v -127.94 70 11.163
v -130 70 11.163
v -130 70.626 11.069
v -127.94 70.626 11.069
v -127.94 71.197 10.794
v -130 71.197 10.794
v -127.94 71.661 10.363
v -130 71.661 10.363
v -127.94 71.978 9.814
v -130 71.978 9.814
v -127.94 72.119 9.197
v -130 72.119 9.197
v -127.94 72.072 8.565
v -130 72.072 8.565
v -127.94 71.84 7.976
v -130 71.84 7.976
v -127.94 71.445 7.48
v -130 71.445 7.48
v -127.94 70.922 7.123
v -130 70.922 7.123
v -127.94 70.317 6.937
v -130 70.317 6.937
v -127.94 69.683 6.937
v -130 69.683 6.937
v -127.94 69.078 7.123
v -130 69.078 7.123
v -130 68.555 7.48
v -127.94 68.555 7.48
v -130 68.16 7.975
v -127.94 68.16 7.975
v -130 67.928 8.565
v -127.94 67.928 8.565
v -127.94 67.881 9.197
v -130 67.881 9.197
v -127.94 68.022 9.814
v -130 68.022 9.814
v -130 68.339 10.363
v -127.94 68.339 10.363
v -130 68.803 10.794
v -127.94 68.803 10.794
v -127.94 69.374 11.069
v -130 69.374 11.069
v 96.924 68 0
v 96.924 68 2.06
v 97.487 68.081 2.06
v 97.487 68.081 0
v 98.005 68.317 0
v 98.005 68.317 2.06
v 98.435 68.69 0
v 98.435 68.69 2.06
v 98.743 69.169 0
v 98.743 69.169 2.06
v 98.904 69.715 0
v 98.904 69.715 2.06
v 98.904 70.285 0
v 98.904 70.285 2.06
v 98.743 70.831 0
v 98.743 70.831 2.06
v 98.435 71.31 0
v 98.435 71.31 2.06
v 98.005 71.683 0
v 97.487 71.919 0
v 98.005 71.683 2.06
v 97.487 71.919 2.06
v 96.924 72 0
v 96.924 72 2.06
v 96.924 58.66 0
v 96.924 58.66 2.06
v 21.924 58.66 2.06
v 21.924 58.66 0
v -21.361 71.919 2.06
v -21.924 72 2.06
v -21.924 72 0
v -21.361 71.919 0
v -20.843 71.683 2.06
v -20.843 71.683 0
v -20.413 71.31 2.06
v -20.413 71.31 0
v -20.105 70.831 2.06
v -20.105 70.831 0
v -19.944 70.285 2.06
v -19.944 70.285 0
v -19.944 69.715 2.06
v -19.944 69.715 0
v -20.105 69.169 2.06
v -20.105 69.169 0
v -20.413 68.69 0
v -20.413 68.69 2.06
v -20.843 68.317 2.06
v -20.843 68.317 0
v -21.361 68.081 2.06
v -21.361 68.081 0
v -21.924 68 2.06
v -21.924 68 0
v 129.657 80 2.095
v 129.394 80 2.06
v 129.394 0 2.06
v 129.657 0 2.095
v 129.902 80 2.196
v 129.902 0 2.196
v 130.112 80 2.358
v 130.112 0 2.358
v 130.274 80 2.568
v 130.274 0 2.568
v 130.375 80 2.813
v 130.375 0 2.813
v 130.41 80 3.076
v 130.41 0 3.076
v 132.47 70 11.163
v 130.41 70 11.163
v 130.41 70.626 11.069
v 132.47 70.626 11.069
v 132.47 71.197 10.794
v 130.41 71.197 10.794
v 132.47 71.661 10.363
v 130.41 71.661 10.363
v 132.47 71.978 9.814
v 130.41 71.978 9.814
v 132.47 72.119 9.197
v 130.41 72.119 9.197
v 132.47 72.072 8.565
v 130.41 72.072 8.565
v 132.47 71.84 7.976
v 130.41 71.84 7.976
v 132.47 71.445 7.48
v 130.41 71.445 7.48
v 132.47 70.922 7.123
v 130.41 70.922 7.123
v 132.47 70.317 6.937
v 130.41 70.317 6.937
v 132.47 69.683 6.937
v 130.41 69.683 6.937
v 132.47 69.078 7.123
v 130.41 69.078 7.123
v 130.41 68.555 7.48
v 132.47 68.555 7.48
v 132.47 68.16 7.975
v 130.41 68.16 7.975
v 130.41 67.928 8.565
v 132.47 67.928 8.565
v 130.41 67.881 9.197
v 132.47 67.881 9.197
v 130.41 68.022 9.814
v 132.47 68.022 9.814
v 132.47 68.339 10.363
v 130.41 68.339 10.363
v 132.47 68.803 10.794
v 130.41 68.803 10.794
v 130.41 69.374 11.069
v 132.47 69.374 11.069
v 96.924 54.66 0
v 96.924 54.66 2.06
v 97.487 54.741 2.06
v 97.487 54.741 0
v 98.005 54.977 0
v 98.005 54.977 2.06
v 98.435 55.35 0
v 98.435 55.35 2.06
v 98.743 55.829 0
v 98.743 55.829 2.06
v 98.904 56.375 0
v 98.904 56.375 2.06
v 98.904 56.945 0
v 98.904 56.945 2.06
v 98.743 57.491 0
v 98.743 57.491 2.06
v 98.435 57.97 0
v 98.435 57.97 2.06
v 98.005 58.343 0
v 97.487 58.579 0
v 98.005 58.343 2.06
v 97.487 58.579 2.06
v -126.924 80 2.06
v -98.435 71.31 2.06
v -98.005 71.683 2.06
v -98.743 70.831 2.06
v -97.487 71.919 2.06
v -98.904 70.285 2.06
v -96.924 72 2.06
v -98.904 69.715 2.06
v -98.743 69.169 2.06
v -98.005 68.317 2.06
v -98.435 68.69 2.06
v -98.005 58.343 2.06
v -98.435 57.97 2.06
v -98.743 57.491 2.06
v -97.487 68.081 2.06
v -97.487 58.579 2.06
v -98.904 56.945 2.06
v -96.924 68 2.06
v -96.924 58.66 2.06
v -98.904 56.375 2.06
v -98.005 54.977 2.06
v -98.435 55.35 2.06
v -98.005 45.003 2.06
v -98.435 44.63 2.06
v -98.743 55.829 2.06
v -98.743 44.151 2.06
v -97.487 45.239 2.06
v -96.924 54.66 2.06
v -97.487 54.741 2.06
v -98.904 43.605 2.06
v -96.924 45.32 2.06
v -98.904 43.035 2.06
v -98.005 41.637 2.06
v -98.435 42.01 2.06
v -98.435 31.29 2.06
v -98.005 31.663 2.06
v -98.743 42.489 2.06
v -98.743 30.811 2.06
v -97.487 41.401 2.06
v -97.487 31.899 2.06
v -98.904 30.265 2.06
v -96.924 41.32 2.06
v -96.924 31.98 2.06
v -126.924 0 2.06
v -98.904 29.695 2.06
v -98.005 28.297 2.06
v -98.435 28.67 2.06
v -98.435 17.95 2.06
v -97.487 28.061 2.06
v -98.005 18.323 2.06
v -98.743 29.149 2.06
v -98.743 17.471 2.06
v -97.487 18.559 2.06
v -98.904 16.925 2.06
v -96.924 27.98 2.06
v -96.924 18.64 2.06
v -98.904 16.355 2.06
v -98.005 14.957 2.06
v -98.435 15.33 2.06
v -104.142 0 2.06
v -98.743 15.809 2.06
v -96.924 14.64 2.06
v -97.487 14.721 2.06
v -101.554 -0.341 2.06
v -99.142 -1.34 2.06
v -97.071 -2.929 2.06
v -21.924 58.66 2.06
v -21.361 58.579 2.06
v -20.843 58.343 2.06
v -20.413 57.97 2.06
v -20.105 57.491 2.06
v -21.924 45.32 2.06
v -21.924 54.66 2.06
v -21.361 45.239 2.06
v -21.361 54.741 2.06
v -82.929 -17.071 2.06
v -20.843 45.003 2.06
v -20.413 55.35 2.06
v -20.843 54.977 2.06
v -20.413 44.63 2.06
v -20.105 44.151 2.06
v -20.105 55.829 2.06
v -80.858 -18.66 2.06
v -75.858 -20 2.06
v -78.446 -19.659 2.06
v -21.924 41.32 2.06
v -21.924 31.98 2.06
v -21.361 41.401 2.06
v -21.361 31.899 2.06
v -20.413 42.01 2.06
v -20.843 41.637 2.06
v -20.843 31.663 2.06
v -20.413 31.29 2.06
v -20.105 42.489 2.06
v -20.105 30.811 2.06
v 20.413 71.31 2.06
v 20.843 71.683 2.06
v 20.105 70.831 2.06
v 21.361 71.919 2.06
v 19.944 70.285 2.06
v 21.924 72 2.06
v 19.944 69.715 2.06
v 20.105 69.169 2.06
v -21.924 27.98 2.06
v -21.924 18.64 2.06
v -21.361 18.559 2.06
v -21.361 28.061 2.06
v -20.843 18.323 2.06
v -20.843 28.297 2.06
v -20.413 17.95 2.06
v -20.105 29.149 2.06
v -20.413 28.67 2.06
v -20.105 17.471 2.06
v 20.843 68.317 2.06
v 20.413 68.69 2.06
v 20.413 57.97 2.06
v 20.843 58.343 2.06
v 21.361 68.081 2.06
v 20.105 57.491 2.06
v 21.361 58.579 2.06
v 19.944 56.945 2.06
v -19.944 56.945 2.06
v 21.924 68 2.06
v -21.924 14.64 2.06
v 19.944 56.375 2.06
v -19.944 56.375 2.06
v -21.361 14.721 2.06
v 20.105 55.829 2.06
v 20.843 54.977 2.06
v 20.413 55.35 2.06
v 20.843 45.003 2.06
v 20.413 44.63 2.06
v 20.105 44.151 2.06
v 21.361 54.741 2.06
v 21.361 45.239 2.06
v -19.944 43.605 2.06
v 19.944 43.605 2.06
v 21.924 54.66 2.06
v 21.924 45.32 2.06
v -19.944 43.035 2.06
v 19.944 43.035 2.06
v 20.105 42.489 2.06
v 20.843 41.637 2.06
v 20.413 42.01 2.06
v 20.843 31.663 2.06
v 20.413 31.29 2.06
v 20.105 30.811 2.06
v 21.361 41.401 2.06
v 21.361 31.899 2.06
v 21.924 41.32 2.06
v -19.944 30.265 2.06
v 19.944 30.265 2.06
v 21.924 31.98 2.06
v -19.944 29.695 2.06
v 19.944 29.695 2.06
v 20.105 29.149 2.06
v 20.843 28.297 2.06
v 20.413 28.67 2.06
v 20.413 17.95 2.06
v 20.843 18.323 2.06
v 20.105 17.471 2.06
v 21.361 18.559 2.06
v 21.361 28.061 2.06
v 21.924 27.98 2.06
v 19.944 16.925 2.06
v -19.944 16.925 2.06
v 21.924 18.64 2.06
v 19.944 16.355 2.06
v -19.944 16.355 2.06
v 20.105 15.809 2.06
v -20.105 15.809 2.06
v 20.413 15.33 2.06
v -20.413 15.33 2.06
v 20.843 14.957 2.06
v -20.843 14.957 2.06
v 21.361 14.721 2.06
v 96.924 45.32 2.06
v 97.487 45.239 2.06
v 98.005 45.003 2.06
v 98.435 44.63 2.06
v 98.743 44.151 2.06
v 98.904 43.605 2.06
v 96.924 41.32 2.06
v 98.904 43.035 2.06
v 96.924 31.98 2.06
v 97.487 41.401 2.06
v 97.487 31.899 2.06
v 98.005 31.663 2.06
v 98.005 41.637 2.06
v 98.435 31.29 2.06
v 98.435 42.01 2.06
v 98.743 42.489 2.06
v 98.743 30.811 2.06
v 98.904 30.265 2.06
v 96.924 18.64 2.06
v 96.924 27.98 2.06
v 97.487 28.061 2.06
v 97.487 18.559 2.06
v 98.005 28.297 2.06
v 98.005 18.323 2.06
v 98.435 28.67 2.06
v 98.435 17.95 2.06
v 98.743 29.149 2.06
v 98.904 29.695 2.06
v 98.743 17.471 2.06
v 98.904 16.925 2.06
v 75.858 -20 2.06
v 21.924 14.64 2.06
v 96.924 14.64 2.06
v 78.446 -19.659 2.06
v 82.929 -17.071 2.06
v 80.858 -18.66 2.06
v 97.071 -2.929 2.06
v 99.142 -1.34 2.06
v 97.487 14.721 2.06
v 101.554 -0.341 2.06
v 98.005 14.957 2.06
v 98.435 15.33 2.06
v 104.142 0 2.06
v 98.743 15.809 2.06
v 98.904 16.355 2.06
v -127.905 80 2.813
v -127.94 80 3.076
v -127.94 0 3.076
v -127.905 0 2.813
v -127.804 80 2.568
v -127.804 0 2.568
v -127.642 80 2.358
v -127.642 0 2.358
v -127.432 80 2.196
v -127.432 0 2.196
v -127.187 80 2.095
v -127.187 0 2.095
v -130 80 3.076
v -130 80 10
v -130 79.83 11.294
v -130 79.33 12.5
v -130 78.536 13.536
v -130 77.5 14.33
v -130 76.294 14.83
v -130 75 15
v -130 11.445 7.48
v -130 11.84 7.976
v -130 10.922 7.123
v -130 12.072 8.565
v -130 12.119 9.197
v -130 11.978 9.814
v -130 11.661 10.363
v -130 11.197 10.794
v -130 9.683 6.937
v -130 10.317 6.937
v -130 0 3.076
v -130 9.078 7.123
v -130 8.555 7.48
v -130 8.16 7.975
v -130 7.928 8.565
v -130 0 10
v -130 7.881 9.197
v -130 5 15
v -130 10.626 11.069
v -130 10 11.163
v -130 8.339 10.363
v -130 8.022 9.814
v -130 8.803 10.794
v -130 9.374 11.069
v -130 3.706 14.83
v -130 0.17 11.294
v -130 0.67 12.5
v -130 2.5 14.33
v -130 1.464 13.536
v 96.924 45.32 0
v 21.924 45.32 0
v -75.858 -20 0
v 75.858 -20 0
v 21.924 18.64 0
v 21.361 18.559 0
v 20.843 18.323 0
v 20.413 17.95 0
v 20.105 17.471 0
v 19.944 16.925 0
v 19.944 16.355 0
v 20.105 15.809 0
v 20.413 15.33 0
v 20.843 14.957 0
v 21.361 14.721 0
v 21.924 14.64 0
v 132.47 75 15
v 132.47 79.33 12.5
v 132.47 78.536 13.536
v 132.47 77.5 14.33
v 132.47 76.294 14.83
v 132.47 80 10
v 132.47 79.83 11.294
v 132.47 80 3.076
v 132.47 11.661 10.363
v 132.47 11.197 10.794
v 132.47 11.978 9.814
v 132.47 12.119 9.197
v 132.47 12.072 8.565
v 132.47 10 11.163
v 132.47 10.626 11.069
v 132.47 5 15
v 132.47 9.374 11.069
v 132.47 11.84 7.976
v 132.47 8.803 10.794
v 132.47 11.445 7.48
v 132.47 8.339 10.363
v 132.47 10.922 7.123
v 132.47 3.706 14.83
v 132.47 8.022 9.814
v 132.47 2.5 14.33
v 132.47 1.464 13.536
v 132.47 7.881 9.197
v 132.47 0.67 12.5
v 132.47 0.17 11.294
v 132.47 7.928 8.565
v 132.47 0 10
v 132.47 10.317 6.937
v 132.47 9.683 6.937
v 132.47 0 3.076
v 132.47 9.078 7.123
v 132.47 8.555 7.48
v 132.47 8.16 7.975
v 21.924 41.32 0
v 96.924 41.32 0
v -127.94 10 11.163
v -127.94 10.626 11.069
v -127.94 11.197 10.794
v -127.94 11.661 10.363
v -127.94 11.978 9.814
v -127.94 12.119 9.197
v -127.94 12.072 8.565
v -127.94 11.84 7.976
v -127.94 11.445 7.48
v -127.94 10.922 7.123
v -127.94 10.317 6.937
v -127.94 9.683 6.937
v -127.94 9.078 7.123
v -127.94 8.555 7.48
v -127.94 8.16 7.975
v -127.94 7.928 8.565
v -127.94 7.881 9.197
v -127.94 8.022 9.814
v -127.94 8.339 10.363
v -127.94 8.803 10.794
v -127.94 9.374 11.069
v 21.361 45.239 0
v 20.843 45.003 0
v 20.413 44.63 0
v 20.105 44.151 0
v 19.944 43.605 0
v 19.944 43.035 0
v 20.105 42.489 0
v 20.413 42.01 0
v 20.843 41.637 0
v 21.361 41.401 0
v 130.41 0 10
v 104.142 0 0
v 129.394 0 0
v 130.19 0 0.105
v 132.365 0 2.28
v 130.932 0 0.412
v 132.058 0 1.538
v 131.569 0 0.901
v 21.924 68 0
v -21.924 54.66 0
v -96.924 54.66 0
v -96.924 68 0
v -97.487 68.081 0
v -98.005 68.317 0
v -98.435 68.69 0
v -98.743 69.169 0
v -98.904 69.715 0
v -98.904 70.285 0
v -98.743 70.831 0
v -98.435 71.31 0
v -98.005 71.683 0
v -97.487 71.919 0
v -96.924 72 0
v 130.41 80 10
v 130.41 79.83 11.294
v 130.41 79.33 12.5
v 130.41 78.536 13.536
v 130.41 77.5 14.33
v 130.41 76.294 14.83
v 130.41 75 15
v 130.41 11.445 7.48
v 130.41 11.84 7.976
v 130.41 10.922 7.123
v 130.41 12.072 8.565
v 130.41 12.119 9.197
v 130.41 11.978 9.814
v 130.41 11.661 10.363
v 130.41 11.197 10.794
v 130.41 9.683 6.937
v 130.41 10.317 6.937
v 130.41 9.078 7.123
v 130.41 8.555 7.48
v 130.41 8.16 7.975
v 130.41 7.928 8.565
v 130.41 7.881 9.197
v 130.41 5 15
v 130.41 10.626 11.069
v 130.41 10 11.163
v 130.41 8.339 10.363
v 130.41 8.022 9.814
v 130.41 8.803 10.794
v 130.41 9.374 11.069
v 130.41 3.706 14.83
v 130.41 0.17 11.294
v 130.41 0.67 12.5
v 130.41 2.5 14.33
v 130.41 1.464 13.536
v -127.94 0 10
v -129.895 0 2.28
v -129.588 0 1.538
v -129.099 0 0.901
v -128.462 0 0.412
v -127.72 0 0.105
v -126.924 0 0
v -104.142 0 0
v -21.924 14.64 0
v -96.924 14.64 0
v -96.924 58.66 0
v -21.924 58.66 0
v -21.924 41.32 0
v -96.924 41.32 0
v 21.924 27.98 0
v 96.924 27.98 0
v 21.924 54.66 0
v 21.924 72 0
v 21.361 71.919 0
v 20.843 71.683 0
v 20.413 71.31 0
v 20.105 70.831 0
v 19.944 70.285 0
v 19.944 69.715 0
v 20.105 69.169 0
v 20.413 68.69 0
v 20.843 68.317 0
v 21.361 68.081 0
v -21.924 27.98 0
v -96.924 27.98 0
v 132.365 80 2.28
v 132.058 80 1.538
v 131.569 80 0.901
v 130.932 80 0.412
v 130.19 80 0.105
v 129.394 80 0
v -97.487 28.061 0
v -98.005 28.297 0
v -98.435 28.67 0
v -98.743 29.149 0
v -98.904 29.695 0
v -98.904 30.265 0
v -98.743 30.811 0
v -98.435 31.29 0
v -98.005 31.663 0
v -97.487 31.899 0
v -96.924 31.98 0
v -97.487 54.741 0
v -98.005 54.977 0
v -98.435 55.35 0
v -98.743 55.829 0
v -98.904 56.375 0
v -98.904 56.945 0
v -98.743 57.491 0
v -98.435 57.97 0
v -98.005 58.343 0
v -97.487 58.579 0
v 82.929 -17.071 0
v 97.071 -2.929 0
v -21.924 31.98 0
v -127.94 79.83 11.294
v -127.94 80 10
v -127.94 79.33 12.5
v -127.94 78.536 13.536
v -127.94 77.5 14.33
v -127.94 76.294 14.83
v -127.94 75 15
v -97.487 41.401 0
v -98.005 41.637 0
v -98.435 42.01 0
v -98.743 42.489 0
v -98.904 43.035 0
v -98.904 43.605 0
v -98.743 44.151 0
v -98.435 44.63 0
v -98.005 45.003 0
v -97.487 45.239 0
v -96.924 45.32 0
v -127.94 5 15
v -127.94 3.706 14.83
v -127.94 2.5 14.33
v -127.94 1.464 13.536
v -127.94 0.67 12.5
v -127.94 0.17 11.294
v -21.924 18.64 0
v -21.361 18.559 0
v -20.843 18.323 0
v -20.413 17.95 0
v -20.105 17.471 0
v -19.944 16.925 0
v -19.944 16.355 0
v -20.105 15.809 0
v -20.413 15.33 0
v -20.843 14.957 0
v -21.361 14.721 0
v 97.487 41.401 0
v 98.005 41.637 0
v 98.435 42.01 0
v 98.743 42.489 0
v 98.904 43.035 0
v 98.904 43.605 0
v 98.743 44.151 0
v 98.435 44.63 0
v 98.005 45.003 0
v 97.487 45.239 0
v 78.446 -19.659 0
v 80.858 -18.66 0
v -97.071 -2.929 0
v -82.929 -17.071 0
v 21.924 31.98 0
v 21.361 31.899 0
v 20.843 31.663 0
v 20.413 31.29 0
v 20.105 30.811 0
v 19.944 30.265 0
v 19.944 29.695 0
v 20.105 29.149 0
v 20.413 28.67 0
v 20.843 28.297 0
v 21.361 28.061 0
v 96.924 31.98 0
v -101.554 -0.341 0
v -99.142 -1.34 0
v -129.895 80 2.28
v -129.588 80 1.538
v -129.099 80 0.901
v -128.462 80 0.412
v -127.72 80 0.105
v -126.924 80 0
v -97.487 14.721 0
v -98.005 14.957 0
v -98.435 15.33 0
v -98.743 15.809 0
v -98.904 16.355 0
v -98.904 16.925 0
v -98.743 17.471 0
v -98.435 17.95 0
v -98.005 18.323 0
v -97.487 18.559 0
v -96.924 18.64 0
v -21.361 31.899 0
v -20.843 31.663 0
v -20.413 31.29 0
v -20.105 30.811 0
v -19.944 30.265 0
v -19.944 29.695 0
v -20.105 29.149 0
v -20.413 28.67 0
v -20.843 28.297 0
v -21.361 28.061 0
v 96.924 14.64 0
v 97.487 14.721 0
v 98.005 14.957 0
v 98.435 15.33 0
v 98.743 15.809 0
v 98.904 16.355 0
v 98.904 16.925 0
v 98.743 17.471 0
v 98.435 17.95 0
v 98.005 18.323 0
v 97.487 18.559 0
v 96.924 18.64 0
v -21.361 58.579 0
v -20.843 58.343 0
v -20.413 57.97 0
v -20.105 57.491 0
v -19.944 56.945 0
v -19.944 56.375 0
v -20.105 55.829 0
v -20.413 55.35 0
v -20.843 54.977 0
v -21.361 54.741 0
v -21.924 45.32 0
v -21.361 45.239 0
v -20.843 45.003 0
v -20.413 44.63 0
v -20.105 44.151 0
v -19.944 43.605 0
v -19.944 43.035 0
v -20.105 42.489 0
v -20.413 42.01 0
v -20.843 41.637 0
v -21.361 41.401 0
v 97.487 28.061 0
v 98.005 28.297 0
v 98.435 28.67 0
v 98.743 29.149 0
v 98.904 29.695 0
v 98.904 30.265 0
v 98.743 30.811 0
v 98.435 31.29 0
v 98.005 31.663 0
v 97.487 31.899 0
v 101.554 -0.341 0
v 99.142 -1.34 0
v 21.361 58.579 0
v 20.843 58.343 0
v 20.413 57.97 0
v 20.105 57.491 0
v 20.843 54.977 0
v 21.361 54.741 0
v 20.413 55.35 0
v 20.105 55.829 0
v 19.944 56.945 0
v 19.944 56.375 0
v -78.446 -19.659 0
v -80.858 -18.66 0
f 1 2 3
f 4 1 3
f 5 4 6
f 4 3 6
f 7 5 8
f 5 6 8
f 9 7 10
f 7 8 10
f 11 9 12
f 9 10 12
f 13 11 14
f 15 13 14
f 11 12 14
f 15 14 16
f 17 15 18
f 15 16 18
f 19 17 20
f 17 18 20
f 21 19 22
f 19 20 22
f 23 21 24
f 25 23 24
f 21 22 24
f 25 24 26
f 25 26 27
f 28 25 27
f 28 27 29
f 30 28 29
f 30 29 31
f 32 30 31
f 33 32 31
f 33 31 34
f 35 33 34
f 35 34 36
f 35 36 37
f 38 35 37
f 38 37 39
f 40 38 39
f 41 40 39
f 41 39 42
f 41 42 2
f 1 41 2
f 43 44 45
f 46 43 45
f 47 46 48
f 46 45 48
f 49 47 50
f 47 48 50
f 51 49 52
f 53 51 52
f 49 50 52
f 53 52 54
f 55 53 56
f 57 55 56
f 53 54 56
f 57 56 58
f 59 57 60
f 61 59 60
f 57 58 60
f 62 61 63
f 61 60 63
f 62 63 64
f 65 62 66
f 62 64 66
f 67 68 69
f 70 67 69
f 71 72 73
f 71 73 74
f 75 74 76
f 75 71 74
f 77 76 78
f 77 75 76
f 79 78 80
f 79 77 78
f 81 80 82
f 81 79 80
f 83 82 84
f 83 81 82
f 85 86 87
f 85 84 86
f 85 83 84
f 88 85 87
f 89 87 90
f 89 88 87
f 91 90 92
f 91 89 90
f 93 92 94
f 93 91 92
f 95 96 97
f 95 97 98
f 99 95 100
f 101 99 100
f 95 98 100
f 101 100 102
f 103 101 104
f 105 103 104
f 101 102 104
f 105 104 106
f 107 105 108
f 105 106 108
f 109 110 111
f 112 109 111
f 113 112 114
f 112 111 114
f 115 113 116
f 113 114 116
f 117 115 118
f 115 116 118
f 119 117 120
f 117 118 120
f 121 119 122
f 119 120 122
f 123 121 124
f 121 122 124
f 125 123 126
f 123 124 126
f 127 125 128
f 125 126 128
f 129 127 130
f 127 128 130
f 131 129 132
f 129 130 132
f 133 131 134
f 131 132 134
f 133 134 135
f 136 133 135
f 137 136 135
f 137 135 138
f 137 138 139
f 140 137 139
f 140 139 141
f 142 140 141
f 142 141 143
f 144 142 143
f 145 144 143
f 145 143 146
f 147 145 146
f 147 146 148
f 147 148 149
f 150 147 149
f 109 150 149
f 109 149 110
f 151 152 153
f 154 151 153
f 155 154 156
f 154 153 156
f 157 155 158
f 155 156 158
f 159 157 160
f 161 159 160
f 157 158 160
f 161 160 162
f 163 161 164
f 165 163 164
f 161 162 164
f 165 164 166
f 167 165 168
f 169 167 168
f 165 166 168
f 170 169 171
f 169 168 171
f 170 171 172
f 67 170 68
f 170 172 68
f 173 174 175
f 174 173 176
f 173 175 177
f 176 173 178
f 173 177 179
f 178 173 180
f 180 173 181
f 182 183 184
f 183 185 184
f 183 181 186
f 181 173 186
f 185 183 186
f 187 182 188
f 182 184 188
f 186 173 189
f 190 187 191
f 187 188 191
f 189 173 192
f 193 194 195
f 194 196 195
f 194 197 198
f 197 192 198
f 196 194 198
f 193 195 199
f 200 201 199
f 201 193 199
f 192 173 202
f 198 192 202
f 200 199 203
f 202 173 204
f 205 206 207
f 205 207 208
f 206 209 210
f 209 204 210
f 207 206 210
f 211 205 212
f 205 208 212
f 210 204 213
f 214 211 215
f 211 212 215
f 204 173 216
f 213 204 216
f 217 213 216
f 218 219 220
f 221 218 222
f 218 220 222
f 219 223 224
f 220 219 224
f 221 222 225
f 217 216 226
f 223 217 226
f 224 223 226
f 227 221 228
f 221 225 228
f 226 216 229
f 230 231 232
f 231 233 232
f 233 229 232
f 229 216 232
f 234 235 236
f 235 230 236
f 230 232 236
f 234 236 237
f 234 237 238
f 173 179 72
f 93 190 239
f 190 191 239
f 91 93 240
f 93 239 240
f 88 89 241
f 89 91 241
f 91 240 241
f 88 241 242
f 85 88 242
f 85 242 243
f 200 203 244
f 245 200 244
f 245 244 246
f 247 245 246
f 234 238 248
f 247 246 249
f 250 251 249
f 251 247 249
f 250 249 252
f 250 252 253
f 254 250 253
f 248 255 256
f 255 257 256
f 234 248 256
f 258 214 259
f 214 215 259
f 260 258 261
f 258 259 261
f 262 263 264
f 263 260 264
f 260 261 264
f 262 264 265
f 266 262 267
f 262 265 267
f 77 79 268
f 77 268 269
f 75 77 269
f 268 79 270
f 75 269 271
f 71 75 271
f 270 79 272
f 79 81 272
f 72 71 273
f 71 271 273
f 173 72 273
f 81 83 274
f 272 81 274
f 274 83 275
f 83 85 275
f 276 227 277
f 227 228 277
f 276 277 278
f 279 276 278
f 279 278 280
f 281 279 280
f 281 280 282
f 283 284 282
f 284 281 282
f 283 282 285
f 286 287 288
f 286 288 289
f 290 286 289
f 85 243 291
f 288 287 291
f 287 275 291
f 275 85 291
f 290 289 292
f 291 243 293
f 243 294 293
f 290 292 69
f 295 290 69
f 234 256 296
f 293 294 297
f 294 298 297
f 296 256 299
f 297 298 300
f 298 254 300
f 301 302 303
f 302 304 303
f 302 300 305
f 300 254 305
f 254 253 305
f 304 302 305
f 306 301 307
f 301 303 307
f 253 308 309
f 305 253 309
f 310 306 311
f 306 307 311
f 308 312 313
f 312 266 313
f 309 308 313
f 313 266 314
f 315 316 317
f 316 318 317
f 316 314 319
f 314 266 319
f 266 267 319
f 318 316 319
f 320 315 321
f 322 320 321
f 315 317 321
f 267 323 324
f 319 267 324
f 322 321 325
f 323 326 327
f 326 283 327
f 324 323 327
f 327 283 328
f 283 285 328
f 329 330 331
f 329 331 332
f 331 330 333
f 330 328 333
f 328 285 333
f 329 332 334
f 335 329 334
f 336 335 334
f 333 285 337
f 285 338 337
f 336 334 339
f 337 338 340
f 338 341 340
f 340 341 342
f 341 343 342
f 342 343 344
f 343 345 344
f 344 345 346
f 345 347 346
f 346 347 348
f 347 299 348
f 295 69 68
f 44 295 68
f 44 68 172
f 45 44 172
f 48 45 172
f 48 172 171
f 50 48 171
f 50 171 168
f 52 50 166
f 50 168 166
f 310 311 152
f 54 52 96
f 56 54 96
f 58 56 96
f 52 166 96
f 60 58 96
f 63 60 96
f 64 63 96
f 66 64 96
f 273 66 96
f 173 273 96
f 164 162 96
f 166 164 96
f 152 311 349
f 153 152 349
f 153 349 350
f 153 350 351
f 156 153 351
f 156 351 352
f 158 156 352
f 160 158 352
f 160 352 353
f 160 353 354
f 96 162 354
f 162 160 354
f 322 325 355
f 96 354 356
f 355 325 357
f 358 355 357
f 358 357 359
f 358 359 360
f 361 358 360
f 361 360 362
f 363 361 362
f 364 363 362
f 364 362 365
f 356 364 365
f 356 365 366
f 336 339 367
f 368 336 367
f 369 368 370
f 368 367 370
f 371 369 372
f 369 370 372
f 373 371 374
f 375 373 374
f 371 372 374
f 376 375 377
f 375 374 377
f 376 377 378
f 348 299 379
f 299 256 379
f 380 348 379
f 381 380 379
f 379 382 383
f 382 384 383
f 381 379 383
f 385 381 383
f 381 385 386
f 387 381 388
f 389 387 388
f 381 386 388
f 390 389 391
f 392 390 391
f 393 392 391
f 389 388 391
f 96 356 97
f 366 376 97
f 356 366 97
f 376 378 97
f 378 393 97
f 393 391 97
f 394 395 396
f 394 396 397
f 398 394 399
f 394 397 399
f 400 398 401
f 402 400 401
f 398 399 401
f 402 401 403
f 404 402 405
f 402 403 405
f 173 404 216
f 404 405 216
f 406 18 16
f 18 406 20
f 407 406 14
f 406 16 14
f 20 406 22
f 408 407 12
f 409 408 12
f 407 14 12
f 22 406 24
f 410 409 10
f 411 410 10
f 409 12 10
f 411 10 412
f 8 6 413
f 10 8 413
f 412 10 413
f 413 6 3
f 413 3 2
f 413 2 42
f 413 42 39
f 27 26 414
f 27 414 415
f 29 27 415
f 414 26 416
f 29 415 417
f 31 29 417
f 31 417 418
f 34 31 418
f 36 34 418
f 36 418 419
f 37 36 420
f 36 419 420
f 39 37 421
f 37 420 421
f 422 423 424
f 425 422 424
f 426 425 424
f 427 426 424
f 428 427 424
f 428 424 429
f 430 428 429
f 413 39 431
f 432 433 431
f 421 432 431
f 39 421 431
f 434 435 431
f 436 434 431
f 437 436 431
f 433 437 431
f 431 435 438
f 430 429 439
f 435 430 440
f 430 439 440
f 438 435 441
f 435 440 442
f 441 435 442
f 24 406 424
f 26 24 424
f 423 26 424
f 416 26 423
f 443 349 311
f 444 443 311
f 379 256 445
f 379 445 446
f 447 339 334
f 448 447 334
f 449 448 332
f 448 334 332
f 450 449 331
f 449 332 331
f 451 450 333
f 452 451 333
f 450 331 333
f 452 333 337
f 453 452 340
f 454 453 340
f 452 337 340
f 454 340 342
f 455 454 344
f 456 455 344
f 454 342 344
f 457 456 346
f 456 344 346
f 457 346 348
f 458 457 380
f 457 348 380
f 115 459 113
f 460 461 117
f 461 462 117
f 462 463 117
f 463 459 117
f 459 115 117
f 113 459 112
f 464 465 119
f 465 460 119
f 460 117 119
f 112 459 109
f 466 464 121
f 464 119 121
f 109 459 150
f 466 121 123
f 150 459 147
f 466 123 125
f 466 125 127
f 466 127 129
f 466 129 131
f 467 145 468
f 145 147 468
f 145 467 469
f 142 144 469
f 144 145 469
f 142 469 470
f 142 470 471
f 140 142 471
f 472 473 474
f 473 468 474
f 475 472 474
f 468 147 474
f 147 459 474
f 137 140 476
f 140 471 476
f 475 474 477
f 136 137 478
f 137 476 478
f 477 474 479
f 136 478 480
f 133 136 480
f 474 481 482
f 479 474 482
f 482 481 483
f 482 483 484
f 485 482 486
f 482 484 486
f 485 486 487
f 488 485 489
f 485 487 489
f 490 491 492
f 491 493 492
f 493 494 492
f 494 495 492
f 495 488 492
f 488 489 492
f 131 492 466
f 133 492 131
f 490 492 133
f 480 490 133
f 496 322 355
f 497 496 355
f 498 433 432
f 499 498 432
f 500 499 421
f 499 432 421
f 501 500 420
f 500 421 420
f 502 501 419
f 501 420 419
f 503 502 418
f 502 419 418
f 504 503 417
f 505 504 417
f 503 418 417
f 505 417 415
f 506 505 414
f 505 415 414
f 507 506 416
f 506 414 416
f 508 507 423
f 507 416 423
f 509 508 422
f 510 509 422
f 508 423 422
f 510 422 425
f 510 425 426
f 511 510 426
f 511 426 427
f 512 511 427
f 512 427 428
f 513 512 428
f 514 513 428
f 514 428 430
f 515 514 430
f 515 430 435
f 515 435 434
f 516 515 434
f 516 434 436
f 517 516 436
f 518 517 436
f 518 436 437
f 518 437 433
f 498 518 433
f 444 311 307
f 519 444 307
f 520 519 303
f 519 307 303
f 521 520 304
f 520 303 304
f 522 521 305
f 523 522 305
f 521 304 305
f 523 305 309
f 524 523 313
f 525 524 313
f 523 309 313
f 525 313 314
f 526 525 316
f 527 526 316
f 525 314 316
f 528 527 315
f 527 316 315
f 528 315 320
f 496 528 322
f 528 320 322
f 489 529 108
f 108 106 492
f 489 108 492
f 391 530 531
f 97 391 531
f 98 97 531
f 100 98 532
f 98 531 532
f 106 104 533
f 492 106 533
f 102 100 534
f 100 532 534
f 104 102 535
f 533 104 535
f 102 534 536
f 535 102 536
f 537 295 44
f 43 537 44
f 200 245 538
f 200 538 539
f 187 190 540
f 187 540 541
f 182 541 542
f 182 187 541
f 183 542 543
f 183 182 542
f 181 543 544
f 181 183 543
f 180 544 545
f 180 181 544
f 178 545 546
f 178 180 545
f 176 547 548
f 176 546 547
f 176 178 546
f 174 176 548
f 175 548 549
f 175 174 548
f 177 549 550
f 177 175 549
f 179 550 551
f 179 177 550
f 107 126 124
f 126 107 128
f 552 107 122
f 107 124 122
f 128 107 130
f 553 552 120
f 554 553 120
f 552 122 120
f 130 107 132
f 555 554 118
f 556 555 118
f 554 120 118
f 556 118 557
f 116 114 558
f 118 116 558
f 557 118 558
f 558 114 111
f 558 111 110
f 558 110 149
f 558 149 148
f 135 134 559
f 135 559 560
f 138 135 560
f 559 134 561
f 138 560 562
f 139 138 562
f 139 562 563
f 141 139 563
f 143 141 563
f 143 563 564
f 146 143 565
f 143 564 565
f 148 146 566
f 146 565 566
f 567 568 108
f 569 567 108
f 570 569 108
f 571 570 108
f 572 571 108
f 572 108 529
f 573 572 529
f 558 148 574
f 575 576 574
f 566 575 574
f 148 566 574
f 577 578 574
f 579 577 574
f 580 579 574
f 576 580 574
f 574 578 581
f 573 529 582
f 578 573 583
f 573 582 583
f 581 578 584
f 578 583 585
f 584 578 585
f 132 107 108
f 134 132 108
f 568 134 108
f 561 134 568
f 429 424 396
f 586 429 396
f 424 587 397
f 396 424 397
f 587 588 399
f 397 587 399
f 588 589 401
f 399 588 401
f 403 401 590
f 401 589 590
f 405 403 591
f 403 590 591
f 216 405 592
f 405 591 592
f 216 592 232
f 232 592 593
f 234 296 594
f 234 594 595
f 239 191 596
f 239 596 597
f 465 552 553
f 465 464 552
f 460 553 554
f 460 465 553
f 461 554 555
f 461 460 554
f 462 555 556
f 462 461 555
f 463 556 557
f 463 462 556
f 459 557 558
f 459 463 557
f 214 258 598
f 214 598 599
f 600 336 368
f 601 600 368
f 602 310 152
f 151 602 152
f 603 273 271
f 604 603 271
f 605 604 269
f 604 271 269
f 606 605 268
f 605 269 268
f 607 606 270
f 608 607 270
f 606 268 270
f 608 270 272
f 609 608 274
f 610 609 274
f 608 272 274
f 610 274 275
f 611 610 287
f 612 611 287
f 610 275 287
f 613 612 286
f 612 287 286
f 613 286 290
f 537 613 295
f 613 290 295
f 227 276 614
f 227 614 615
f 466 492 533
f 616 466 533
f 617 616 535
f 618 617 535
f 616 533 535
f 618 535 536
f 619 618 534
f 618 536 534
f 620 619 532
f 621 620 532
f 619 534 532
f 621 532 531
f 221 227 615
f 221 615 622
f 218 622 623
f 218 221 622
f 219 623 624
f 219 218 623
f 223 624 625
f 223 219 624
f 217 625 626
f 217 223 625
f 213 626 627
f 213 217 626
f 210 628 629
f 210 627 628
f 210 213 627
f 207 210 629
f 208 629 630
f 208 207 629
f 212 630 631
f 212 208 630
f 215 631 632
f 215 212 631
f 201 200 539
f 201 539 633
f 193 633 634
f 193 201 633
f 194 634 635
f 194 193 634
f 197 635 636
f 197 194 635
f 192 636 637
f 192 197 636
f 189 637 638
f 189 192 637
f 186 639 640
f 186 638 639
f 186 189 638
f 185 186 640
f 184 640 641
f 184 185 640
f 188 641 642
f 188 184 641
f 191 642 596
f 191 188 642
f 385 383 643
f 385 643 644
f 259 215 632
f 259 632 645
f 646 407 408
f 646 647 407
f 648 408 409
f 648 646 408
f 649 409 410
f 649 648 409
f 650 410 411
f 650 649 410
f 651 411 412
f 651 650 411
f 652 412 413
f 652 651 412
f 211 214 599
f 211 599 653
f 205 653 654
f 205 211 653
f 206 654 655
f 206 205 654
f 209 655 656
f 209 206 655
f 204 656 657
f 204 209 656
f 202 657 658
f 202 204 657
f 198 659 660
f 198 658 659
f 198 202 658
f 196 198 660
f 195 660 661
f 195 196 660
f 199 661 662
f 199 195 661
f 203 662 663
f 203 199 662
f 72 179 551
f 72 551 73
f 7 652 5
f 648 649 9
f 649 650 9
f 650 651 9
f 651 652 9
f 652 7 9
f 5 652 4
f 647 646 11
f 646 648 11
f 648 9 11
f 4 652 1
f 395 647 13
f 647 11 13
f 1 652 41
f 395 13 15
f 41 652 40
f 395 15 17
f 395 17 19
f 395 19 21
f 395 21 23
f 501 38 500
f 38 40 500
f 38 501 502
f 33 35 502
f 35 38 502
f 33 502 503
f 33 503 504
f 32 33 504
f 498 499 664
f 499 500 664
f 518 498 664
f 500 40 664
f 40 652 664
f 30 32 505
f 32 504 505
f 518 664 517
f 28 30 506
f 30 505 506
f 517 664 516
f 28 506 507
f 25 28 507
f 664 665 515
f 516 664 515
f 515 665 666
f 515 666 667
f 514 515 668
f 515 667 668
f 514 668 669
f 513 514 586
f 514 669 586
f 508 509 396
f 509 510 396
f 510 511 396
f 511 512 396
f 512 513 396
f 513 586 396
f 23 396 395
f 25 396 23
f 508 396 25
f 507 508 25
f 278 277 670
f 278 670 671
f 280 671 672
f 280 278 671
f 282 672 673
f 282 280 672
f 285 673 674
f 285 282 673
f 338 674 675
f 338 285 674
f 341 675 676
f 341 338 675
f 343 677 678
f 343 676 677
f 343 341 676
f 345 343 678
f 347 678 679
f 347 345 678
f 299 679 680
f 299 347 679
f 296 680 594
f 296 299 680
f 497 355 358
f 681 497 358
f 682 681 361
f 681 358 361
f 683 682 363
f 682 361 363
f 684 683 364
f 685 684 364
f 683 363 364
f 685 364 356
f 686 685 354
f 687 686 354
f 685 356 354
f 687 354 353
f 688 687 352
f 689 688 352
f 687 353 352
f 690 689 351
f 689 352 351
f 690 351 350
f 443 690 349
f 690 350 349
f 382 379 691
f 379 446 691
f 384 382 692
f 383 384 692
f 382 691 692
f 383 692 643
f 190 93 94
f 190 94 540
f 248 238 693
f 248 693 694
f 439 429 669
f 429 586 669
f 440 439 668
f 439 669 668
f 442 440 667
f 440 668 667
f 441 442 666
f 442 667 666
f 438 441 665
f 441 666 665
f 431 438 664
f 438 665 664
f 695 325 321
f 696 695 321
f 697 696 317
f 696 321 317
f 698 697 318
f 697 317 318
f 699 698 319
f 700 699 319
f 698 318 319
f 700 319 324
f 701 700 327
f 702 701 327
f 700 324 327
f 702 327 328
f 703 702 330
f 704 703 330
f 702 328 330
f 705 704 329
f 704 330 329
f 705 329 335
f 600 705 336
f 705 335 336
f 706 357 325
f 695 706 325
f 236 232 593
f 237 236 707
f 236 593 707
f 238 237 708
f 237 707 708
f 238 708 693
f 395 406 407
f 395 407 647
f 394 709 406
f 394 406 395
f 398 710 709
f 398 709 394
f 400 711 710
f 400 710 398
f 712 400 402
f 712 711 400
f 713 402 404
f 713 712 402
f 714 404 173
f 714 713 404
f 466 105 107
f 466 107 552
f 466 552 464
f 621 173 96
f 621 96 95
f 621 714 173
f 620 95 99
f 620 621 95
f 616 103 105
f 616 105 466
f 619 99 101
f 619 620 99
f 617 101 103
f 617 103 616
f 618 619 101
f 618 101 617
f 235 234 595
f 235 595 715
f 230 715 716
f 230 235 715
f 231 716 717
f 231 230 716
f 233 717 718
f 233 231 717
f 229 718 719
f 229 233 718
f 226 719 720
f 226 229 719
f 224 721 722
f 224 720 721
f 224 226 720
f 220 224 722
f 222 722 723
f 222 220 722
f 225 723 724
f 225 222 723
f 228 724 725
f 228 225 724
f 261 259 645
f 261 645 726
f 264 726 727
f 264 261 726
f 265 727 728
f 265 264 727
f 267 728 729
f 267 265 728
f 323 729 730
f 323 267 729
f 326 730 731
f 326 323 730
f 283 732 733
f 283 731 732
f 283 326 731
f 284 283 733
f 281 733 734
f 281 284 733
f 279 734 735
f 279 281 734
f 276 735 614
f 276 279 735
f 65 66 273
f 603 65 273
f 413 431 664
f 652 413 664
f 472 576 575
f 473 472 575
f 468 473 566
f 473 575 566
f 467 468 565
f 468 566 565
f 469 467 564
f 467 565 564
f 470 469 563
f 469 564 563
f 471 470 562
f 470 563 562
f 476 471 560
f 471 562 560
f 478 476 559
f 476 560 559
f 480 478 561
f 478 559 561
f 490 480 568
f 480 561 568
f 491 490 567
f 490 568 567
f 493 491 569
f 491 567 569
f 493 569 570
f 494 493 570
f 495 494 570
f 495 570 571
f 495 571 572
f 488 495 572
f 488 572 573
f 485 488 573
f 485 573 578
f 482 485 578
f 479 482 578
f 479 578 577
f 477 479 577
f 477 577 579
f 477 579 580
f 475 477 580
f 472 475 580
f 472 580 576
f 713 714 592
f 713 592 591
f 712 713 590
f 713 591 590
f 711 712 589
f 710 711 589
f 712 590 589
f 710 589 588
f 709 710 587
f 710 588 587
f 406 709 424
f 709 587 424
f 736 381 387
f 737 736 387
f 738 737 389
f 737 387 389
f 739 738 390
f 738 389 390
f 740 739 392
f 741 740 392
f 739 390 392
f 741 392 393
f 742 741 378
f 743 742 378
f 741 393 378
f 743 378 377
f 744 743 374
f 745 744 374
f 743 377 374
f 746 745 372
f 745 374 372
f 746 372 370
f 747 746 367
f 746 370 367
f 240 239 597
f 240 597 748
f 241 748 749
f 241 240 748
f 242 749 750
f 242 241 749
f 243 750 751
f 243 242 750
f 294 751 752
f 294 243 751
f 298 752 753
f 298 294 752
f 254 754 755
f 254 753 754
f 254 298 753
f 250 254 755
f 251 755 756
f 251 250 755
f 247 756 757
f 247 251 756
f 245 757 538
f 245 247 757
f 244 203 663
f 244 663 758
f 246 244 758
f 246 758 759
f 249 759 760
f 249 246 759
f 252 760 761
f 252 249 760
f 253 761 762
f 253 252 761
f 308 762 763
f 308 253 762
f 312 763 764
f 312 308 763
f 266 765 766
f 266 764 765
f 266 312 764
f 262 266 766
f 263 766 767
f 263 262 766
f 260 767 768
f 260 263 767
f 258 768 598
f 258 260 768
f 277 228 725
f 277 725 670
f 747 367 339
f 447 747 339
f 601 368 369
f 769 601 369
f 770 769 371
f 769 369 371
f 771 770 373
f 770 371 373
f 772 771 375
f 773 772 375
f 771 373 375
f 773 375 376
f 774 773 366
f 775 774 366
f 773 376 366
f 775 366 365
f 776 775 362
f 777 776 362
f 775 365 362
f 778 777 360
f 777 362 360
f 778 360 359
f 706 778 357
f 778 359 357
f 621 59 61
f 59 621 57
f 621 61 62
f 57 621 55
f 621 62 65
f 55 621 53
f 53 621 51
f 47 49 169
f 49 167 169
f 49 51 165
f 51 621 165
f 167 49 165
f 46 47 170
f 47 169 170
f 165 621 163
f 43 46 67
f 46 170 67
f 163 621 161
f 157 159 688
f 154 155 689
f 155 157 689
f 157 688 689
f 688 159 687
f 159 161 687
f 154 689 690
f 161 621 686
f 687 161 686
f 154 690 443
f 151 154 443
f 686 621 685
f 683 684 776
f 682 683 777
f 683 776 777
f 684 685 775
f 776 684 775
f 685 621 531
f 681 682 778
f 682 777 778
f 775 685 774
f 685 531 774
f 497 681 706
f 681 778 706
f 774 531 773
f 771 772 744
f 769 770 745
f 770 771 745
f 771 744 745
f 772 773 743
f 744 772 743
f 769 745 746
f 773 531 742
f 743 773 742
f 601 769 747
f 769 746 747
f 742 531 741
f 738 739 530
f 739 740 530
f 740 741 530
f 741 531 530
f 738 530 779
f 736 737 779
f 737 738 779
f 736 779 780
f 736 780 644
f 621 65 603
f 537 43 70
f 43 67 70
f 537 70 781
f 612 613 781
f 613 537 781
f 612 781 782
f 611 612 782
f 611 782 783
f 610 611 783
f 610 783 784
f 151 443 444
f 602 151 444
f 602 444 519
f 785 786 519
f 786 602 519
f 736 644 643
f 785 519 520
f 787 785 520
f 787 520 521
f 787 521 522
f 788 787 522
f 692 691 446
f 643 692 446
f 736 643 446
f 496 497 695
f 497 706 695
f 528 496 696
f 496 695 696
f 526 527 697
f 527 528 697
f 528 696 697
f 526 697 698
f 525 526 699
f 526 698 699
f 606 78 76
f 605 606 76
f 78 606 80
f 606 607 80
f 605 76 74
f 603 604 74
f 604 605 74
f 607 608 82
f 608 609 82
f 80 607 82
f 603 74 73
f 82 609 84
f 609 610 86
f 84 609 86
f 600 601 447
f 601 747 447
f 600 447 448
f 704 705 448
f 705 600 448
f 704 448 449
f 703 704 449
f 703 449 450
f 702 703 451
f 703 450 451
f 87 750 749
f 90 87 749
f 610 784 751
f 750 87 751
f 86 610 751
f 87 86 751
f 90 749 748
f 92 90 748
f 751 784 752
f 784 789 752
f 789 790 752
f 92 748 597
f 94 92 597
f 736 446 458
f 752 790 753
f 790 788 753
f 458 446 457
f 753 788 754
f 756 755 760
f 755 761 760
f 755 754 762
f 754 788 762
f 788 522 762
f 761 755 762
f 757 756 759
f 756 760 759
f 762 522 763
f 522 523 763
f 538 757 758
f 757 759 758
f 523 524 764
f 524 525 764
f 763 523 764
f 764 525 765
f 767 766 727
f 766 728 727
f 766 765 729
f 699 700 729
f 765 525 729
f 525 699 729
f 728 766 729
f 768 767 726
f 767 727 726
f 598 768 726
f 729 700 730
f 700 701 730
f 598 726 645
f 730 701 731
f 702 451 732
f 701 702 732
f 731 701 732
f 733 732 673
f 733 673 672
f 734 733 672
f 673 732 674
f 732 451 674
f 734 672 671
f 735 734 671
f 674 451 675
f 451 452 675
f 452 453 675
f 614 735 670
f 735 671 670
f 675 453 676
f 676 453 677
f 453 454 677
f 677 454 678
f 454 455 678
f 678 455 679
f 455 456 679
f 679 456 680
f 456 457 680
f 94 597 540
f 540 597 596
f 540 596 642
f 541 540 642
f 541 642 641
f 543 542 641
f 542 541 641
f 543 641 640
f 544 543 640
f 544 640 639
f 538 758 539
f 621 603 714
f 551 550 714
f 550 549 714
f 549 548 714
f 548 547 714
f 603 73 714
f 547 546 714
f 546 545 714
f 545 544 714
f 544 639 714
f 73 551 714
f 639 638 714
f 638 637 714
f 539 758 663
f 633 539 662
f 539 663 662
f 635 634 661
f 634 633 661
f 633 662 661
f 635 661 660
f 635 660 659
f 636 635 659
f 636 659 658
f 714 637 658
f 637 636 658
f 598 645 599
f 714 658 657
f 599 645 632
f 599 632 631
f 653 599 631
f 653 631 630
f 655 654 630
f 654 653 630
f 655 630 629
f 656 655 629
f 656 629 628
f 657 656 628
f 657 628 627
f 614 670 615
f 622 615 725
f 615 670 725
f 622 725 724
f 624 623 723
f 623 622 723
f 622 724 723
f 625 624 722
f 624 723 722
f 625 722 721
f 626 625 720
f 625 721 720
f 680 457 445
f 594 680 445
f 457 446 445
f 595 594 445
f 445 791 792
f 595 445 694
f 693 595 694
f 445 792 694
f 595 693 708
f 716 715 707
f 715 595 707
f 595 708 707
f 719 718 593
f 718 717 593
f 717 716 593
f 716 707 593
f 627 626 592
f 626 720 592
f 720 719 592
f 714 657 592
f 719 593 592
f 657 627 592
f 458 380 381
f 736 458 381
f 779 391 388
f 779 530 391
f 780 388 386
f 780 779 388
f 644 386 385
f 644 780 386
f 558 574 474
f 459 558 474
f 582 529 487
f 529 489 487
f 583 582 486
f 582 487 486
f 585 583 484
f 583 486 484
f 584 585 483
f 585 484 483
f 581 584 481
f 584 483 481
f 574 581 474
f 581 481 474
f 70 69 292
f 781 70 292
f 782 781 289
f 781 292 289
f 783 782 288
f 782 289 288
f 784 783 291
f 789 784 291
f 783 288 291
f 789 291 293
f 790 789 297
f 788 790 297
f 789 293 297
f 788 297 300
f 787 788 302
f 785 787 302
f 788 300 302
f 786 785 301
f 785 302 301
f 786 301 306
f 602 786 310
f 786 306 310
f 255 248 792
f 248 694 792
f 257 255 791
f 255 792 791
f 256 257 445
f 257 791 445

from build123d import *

# Parameters (mm, degrees)
BASE_FLANGE1_DEPTH  = 80
SKETCH6_R           = 2.125
CUT_EXTRUDE1_DEPTH  = 275.800838609
FILLET1_R           = 5
BOSS_EXTRUDE1_DEPTH = 2.06
FILLET2_R           = 10
CUT_EXTRUDE2_DEPTH  = 10


# Read off the part's stored shape, not the designer's step: Base-Flange1
with BuildPart() as part:
    # Base-Flange1 outline → Base-Flange1 (new body)
    with BuildSketch(Plane(origin=(0, 0, 0), x_dir=(1, 0, 0), z_dir=(0, 1, 0))):
        with BuildLine():
            Line((-130, -3.076), (-130, -15))
            Line((-130, -15), (-127.94, -15))
            Line((-127.94, -15), (-127.94, -3.076))
            ThreePointArc((-127.94, -3.076), (-127.64242049, -2.35757951), (-126.924, -2.06))
            Line((-126.924, -2.06), (129.394, -2.06))
            ThreePointArc((129.394, -2.06), (130.11242049, -2.35757951), (130.41, -3.076))
            Line((130.41, -3.076), (130.41, -15))
            Line((130.41, -15), (132.47, -15))
            Line((132.47, -15), (132.47, -3.076))
            ThreePointArc((132.47, -3.076), (131.569060459, -0.900939541), (129.394, 0))
            Line((129.394, 0), (-126.924, 0))
            ThreePointArc((-126.924, 0), (-129.099060459, -0.900939541), (-130, -3.076))
        make_face()
    extrude(amount=BASE_FLANGE1_DEPTH)

    # Sketch6 → Cut-Extrude1 (cut, through all)
    with BuildSketch(Plane.ZY.offset(130)):
        with Locations((9.038, 70)):
            Circle(SKETCH6_R)
        with Locations((9.038, 10)):
            Circle(SKETCH6_R)
    extrude(amount=-CUT_EXTRUDE1_DEPTH, mode=Mode.SUBTRACT)

    # Fillet1
    fillet1_edges = [part.edges().sort_by_distance(p)[0] for p in [
        (131.44, 0, 15),
        (-128.97, 0, 15),
        (131.44, 80, 15),
        (-128.97, 80, 15),
    ]]
    fillet(fillet1_edges, radius=FILLET1_R)

    # Sketch7 → Boss-Extrude1 (add)
    with BuildSketch(Plane.XY.offset(2.06)):
        Polygon((-100, 0), (-80, -20), (80, -20), (100, 0), align=None)
    extrude(amount=-BOSS_EXTRUDE1_DEPTH)

    # Fillet2
    fillet2_edges = [part.edges().sort_by_distance(p)[0] for p in [
        (-100, 0, 1.03),
        (100, 0, 1.03),
        (80, -20, 1.03),
        (-80, -20, 1.03),
    ]]
    fillet(fillet2_edges, radius=FILLET2_R)

    # Sketch8 → Cut-Extrude2 (cut)
    with BuildSketch(Plane.XY.offset(2.06)):
        with BuildLine():
            Line((-96.924, 72), (-21.924, 72))
            ThreePointArc((-21.924, 72), (-19.924, 70), (-21.924, 68))
            Line((-21.924, 68), (-96.924, 68))
            ThreePointArc((-96.924, 68), (-98.924, 70), (-96.924, 72))
        make_face()
        with BuildLine():
            Line((-96.924, 58.66), (-21.924, 58.66))
            ThreePointArc((-21.924, 58.66), (-19.924, 56.66), (-21.924, 54.66))
            Line((-21.924, 54.66), (-96.924, 54.66))
            ThreePointArc((-96.924, 54.66), (-98.924, 56.66), (-96.924, 58.66))
        make_face()
        with BuildLine():
            Line((-96.924, 45.32), (-21.924, 45.32))
            ThreePointArc((-21.924, 45.32), (-19.924, 43.32), (-21.924, 41.32))
            Line((-21.924, 41.32), (-96.924, 41.32))
            ThreePointArc((-96.924, 41.32), (-98.924, 43.32), (-96.924, 45.32))
        make_face()
        with BuildLine():
            Line((-96.924, 31.98), (-21.924, 31.98))
            ThreePointArc((-21.924, 31.98), (-19.924, 29.98), (-21.924, 27.98))
            Line((-21.924, 27.98), (-96.924, 27.98))
            ThreePointArc((-96.924, 27.98), (-98.924, 29.98), (-96.924, 31.98))
        make_face()
        with BuildLine():
            Line((-96.924, 18.64), (-21.924, 18.64))
            ThreePointArc((-21.924, 18.64), (-19.924, 16.64), (-21.924, 14.64))
            Line((-21.924, 14.64), (-96.924, 14.64))
            ThreePointArc((-96.924, 14.64), (-98.924, 16.64), (-96.924, 18.64))
        make_face()
        with BuildLine():
            Line((96.924, 72), (21.924, 72))
            ThreePointArc((21.924, 72), (19.924, 70), (21.924, 68))
            Line((21.924, 68), (96.924, 68))
            ThreePointArc((96.924, 68), (98.924, 70), (96.924, 72))
        make_face()
        with BuildLine():
            Line((96.924, 58.66), (21.924, 58.66))
            ThreePointArc((21.924, 58.66), (19.924, 56.66), (21.924, 54.66))
            Line((21.924, 54.66), (96.924, 54.66))
            ThreePointArc((96.924, 54.66), (98.924, 56.66), (96.924, 58.66))
        make_face()
        with BuildLine():
            Line((96.924, 45.32), (21.924, 45.32))
            ThreePointArc((21.924, 45.32), (19.924, 43.32), (21.924, 41.32))
            Line((21.924, 41.32), (96.924, 41.32))
            ThreePointArc((96.924, 41.32), (98.924, 43.32), (96.924, 45.32))
        make_face()
        with BuildLine():
            Line((96.924, 31.98), (21.924, 31.98))
            ThreePointArc((21.924, 31.98), (19.924, 29.98), (21.924, 27.98))
            Line((21.924, 27.98), (96.924, 27.98))
            ThreePointArc((96.924, 27.98), (98.924, 29.98), (96.924, 31.98))
        make_face()
        with BuildLine():
            Line((96.924, 18.64), (21.924, 18.64))
            ThreePointArc((21.924, 18.64), (19.924, 16.64), (21.924, 14.64))
            Line((21.924, 14.64), (96.924, 14.64))
            ThreePointArc((96.924, 14.64), (98.924, 16.64), (96.924, 18.64))
        make_face()
    extrude(amount=-CUT_EXTRUDE2_DEPTH, mode=Mode.SUBTRACT)


solid = part.part
